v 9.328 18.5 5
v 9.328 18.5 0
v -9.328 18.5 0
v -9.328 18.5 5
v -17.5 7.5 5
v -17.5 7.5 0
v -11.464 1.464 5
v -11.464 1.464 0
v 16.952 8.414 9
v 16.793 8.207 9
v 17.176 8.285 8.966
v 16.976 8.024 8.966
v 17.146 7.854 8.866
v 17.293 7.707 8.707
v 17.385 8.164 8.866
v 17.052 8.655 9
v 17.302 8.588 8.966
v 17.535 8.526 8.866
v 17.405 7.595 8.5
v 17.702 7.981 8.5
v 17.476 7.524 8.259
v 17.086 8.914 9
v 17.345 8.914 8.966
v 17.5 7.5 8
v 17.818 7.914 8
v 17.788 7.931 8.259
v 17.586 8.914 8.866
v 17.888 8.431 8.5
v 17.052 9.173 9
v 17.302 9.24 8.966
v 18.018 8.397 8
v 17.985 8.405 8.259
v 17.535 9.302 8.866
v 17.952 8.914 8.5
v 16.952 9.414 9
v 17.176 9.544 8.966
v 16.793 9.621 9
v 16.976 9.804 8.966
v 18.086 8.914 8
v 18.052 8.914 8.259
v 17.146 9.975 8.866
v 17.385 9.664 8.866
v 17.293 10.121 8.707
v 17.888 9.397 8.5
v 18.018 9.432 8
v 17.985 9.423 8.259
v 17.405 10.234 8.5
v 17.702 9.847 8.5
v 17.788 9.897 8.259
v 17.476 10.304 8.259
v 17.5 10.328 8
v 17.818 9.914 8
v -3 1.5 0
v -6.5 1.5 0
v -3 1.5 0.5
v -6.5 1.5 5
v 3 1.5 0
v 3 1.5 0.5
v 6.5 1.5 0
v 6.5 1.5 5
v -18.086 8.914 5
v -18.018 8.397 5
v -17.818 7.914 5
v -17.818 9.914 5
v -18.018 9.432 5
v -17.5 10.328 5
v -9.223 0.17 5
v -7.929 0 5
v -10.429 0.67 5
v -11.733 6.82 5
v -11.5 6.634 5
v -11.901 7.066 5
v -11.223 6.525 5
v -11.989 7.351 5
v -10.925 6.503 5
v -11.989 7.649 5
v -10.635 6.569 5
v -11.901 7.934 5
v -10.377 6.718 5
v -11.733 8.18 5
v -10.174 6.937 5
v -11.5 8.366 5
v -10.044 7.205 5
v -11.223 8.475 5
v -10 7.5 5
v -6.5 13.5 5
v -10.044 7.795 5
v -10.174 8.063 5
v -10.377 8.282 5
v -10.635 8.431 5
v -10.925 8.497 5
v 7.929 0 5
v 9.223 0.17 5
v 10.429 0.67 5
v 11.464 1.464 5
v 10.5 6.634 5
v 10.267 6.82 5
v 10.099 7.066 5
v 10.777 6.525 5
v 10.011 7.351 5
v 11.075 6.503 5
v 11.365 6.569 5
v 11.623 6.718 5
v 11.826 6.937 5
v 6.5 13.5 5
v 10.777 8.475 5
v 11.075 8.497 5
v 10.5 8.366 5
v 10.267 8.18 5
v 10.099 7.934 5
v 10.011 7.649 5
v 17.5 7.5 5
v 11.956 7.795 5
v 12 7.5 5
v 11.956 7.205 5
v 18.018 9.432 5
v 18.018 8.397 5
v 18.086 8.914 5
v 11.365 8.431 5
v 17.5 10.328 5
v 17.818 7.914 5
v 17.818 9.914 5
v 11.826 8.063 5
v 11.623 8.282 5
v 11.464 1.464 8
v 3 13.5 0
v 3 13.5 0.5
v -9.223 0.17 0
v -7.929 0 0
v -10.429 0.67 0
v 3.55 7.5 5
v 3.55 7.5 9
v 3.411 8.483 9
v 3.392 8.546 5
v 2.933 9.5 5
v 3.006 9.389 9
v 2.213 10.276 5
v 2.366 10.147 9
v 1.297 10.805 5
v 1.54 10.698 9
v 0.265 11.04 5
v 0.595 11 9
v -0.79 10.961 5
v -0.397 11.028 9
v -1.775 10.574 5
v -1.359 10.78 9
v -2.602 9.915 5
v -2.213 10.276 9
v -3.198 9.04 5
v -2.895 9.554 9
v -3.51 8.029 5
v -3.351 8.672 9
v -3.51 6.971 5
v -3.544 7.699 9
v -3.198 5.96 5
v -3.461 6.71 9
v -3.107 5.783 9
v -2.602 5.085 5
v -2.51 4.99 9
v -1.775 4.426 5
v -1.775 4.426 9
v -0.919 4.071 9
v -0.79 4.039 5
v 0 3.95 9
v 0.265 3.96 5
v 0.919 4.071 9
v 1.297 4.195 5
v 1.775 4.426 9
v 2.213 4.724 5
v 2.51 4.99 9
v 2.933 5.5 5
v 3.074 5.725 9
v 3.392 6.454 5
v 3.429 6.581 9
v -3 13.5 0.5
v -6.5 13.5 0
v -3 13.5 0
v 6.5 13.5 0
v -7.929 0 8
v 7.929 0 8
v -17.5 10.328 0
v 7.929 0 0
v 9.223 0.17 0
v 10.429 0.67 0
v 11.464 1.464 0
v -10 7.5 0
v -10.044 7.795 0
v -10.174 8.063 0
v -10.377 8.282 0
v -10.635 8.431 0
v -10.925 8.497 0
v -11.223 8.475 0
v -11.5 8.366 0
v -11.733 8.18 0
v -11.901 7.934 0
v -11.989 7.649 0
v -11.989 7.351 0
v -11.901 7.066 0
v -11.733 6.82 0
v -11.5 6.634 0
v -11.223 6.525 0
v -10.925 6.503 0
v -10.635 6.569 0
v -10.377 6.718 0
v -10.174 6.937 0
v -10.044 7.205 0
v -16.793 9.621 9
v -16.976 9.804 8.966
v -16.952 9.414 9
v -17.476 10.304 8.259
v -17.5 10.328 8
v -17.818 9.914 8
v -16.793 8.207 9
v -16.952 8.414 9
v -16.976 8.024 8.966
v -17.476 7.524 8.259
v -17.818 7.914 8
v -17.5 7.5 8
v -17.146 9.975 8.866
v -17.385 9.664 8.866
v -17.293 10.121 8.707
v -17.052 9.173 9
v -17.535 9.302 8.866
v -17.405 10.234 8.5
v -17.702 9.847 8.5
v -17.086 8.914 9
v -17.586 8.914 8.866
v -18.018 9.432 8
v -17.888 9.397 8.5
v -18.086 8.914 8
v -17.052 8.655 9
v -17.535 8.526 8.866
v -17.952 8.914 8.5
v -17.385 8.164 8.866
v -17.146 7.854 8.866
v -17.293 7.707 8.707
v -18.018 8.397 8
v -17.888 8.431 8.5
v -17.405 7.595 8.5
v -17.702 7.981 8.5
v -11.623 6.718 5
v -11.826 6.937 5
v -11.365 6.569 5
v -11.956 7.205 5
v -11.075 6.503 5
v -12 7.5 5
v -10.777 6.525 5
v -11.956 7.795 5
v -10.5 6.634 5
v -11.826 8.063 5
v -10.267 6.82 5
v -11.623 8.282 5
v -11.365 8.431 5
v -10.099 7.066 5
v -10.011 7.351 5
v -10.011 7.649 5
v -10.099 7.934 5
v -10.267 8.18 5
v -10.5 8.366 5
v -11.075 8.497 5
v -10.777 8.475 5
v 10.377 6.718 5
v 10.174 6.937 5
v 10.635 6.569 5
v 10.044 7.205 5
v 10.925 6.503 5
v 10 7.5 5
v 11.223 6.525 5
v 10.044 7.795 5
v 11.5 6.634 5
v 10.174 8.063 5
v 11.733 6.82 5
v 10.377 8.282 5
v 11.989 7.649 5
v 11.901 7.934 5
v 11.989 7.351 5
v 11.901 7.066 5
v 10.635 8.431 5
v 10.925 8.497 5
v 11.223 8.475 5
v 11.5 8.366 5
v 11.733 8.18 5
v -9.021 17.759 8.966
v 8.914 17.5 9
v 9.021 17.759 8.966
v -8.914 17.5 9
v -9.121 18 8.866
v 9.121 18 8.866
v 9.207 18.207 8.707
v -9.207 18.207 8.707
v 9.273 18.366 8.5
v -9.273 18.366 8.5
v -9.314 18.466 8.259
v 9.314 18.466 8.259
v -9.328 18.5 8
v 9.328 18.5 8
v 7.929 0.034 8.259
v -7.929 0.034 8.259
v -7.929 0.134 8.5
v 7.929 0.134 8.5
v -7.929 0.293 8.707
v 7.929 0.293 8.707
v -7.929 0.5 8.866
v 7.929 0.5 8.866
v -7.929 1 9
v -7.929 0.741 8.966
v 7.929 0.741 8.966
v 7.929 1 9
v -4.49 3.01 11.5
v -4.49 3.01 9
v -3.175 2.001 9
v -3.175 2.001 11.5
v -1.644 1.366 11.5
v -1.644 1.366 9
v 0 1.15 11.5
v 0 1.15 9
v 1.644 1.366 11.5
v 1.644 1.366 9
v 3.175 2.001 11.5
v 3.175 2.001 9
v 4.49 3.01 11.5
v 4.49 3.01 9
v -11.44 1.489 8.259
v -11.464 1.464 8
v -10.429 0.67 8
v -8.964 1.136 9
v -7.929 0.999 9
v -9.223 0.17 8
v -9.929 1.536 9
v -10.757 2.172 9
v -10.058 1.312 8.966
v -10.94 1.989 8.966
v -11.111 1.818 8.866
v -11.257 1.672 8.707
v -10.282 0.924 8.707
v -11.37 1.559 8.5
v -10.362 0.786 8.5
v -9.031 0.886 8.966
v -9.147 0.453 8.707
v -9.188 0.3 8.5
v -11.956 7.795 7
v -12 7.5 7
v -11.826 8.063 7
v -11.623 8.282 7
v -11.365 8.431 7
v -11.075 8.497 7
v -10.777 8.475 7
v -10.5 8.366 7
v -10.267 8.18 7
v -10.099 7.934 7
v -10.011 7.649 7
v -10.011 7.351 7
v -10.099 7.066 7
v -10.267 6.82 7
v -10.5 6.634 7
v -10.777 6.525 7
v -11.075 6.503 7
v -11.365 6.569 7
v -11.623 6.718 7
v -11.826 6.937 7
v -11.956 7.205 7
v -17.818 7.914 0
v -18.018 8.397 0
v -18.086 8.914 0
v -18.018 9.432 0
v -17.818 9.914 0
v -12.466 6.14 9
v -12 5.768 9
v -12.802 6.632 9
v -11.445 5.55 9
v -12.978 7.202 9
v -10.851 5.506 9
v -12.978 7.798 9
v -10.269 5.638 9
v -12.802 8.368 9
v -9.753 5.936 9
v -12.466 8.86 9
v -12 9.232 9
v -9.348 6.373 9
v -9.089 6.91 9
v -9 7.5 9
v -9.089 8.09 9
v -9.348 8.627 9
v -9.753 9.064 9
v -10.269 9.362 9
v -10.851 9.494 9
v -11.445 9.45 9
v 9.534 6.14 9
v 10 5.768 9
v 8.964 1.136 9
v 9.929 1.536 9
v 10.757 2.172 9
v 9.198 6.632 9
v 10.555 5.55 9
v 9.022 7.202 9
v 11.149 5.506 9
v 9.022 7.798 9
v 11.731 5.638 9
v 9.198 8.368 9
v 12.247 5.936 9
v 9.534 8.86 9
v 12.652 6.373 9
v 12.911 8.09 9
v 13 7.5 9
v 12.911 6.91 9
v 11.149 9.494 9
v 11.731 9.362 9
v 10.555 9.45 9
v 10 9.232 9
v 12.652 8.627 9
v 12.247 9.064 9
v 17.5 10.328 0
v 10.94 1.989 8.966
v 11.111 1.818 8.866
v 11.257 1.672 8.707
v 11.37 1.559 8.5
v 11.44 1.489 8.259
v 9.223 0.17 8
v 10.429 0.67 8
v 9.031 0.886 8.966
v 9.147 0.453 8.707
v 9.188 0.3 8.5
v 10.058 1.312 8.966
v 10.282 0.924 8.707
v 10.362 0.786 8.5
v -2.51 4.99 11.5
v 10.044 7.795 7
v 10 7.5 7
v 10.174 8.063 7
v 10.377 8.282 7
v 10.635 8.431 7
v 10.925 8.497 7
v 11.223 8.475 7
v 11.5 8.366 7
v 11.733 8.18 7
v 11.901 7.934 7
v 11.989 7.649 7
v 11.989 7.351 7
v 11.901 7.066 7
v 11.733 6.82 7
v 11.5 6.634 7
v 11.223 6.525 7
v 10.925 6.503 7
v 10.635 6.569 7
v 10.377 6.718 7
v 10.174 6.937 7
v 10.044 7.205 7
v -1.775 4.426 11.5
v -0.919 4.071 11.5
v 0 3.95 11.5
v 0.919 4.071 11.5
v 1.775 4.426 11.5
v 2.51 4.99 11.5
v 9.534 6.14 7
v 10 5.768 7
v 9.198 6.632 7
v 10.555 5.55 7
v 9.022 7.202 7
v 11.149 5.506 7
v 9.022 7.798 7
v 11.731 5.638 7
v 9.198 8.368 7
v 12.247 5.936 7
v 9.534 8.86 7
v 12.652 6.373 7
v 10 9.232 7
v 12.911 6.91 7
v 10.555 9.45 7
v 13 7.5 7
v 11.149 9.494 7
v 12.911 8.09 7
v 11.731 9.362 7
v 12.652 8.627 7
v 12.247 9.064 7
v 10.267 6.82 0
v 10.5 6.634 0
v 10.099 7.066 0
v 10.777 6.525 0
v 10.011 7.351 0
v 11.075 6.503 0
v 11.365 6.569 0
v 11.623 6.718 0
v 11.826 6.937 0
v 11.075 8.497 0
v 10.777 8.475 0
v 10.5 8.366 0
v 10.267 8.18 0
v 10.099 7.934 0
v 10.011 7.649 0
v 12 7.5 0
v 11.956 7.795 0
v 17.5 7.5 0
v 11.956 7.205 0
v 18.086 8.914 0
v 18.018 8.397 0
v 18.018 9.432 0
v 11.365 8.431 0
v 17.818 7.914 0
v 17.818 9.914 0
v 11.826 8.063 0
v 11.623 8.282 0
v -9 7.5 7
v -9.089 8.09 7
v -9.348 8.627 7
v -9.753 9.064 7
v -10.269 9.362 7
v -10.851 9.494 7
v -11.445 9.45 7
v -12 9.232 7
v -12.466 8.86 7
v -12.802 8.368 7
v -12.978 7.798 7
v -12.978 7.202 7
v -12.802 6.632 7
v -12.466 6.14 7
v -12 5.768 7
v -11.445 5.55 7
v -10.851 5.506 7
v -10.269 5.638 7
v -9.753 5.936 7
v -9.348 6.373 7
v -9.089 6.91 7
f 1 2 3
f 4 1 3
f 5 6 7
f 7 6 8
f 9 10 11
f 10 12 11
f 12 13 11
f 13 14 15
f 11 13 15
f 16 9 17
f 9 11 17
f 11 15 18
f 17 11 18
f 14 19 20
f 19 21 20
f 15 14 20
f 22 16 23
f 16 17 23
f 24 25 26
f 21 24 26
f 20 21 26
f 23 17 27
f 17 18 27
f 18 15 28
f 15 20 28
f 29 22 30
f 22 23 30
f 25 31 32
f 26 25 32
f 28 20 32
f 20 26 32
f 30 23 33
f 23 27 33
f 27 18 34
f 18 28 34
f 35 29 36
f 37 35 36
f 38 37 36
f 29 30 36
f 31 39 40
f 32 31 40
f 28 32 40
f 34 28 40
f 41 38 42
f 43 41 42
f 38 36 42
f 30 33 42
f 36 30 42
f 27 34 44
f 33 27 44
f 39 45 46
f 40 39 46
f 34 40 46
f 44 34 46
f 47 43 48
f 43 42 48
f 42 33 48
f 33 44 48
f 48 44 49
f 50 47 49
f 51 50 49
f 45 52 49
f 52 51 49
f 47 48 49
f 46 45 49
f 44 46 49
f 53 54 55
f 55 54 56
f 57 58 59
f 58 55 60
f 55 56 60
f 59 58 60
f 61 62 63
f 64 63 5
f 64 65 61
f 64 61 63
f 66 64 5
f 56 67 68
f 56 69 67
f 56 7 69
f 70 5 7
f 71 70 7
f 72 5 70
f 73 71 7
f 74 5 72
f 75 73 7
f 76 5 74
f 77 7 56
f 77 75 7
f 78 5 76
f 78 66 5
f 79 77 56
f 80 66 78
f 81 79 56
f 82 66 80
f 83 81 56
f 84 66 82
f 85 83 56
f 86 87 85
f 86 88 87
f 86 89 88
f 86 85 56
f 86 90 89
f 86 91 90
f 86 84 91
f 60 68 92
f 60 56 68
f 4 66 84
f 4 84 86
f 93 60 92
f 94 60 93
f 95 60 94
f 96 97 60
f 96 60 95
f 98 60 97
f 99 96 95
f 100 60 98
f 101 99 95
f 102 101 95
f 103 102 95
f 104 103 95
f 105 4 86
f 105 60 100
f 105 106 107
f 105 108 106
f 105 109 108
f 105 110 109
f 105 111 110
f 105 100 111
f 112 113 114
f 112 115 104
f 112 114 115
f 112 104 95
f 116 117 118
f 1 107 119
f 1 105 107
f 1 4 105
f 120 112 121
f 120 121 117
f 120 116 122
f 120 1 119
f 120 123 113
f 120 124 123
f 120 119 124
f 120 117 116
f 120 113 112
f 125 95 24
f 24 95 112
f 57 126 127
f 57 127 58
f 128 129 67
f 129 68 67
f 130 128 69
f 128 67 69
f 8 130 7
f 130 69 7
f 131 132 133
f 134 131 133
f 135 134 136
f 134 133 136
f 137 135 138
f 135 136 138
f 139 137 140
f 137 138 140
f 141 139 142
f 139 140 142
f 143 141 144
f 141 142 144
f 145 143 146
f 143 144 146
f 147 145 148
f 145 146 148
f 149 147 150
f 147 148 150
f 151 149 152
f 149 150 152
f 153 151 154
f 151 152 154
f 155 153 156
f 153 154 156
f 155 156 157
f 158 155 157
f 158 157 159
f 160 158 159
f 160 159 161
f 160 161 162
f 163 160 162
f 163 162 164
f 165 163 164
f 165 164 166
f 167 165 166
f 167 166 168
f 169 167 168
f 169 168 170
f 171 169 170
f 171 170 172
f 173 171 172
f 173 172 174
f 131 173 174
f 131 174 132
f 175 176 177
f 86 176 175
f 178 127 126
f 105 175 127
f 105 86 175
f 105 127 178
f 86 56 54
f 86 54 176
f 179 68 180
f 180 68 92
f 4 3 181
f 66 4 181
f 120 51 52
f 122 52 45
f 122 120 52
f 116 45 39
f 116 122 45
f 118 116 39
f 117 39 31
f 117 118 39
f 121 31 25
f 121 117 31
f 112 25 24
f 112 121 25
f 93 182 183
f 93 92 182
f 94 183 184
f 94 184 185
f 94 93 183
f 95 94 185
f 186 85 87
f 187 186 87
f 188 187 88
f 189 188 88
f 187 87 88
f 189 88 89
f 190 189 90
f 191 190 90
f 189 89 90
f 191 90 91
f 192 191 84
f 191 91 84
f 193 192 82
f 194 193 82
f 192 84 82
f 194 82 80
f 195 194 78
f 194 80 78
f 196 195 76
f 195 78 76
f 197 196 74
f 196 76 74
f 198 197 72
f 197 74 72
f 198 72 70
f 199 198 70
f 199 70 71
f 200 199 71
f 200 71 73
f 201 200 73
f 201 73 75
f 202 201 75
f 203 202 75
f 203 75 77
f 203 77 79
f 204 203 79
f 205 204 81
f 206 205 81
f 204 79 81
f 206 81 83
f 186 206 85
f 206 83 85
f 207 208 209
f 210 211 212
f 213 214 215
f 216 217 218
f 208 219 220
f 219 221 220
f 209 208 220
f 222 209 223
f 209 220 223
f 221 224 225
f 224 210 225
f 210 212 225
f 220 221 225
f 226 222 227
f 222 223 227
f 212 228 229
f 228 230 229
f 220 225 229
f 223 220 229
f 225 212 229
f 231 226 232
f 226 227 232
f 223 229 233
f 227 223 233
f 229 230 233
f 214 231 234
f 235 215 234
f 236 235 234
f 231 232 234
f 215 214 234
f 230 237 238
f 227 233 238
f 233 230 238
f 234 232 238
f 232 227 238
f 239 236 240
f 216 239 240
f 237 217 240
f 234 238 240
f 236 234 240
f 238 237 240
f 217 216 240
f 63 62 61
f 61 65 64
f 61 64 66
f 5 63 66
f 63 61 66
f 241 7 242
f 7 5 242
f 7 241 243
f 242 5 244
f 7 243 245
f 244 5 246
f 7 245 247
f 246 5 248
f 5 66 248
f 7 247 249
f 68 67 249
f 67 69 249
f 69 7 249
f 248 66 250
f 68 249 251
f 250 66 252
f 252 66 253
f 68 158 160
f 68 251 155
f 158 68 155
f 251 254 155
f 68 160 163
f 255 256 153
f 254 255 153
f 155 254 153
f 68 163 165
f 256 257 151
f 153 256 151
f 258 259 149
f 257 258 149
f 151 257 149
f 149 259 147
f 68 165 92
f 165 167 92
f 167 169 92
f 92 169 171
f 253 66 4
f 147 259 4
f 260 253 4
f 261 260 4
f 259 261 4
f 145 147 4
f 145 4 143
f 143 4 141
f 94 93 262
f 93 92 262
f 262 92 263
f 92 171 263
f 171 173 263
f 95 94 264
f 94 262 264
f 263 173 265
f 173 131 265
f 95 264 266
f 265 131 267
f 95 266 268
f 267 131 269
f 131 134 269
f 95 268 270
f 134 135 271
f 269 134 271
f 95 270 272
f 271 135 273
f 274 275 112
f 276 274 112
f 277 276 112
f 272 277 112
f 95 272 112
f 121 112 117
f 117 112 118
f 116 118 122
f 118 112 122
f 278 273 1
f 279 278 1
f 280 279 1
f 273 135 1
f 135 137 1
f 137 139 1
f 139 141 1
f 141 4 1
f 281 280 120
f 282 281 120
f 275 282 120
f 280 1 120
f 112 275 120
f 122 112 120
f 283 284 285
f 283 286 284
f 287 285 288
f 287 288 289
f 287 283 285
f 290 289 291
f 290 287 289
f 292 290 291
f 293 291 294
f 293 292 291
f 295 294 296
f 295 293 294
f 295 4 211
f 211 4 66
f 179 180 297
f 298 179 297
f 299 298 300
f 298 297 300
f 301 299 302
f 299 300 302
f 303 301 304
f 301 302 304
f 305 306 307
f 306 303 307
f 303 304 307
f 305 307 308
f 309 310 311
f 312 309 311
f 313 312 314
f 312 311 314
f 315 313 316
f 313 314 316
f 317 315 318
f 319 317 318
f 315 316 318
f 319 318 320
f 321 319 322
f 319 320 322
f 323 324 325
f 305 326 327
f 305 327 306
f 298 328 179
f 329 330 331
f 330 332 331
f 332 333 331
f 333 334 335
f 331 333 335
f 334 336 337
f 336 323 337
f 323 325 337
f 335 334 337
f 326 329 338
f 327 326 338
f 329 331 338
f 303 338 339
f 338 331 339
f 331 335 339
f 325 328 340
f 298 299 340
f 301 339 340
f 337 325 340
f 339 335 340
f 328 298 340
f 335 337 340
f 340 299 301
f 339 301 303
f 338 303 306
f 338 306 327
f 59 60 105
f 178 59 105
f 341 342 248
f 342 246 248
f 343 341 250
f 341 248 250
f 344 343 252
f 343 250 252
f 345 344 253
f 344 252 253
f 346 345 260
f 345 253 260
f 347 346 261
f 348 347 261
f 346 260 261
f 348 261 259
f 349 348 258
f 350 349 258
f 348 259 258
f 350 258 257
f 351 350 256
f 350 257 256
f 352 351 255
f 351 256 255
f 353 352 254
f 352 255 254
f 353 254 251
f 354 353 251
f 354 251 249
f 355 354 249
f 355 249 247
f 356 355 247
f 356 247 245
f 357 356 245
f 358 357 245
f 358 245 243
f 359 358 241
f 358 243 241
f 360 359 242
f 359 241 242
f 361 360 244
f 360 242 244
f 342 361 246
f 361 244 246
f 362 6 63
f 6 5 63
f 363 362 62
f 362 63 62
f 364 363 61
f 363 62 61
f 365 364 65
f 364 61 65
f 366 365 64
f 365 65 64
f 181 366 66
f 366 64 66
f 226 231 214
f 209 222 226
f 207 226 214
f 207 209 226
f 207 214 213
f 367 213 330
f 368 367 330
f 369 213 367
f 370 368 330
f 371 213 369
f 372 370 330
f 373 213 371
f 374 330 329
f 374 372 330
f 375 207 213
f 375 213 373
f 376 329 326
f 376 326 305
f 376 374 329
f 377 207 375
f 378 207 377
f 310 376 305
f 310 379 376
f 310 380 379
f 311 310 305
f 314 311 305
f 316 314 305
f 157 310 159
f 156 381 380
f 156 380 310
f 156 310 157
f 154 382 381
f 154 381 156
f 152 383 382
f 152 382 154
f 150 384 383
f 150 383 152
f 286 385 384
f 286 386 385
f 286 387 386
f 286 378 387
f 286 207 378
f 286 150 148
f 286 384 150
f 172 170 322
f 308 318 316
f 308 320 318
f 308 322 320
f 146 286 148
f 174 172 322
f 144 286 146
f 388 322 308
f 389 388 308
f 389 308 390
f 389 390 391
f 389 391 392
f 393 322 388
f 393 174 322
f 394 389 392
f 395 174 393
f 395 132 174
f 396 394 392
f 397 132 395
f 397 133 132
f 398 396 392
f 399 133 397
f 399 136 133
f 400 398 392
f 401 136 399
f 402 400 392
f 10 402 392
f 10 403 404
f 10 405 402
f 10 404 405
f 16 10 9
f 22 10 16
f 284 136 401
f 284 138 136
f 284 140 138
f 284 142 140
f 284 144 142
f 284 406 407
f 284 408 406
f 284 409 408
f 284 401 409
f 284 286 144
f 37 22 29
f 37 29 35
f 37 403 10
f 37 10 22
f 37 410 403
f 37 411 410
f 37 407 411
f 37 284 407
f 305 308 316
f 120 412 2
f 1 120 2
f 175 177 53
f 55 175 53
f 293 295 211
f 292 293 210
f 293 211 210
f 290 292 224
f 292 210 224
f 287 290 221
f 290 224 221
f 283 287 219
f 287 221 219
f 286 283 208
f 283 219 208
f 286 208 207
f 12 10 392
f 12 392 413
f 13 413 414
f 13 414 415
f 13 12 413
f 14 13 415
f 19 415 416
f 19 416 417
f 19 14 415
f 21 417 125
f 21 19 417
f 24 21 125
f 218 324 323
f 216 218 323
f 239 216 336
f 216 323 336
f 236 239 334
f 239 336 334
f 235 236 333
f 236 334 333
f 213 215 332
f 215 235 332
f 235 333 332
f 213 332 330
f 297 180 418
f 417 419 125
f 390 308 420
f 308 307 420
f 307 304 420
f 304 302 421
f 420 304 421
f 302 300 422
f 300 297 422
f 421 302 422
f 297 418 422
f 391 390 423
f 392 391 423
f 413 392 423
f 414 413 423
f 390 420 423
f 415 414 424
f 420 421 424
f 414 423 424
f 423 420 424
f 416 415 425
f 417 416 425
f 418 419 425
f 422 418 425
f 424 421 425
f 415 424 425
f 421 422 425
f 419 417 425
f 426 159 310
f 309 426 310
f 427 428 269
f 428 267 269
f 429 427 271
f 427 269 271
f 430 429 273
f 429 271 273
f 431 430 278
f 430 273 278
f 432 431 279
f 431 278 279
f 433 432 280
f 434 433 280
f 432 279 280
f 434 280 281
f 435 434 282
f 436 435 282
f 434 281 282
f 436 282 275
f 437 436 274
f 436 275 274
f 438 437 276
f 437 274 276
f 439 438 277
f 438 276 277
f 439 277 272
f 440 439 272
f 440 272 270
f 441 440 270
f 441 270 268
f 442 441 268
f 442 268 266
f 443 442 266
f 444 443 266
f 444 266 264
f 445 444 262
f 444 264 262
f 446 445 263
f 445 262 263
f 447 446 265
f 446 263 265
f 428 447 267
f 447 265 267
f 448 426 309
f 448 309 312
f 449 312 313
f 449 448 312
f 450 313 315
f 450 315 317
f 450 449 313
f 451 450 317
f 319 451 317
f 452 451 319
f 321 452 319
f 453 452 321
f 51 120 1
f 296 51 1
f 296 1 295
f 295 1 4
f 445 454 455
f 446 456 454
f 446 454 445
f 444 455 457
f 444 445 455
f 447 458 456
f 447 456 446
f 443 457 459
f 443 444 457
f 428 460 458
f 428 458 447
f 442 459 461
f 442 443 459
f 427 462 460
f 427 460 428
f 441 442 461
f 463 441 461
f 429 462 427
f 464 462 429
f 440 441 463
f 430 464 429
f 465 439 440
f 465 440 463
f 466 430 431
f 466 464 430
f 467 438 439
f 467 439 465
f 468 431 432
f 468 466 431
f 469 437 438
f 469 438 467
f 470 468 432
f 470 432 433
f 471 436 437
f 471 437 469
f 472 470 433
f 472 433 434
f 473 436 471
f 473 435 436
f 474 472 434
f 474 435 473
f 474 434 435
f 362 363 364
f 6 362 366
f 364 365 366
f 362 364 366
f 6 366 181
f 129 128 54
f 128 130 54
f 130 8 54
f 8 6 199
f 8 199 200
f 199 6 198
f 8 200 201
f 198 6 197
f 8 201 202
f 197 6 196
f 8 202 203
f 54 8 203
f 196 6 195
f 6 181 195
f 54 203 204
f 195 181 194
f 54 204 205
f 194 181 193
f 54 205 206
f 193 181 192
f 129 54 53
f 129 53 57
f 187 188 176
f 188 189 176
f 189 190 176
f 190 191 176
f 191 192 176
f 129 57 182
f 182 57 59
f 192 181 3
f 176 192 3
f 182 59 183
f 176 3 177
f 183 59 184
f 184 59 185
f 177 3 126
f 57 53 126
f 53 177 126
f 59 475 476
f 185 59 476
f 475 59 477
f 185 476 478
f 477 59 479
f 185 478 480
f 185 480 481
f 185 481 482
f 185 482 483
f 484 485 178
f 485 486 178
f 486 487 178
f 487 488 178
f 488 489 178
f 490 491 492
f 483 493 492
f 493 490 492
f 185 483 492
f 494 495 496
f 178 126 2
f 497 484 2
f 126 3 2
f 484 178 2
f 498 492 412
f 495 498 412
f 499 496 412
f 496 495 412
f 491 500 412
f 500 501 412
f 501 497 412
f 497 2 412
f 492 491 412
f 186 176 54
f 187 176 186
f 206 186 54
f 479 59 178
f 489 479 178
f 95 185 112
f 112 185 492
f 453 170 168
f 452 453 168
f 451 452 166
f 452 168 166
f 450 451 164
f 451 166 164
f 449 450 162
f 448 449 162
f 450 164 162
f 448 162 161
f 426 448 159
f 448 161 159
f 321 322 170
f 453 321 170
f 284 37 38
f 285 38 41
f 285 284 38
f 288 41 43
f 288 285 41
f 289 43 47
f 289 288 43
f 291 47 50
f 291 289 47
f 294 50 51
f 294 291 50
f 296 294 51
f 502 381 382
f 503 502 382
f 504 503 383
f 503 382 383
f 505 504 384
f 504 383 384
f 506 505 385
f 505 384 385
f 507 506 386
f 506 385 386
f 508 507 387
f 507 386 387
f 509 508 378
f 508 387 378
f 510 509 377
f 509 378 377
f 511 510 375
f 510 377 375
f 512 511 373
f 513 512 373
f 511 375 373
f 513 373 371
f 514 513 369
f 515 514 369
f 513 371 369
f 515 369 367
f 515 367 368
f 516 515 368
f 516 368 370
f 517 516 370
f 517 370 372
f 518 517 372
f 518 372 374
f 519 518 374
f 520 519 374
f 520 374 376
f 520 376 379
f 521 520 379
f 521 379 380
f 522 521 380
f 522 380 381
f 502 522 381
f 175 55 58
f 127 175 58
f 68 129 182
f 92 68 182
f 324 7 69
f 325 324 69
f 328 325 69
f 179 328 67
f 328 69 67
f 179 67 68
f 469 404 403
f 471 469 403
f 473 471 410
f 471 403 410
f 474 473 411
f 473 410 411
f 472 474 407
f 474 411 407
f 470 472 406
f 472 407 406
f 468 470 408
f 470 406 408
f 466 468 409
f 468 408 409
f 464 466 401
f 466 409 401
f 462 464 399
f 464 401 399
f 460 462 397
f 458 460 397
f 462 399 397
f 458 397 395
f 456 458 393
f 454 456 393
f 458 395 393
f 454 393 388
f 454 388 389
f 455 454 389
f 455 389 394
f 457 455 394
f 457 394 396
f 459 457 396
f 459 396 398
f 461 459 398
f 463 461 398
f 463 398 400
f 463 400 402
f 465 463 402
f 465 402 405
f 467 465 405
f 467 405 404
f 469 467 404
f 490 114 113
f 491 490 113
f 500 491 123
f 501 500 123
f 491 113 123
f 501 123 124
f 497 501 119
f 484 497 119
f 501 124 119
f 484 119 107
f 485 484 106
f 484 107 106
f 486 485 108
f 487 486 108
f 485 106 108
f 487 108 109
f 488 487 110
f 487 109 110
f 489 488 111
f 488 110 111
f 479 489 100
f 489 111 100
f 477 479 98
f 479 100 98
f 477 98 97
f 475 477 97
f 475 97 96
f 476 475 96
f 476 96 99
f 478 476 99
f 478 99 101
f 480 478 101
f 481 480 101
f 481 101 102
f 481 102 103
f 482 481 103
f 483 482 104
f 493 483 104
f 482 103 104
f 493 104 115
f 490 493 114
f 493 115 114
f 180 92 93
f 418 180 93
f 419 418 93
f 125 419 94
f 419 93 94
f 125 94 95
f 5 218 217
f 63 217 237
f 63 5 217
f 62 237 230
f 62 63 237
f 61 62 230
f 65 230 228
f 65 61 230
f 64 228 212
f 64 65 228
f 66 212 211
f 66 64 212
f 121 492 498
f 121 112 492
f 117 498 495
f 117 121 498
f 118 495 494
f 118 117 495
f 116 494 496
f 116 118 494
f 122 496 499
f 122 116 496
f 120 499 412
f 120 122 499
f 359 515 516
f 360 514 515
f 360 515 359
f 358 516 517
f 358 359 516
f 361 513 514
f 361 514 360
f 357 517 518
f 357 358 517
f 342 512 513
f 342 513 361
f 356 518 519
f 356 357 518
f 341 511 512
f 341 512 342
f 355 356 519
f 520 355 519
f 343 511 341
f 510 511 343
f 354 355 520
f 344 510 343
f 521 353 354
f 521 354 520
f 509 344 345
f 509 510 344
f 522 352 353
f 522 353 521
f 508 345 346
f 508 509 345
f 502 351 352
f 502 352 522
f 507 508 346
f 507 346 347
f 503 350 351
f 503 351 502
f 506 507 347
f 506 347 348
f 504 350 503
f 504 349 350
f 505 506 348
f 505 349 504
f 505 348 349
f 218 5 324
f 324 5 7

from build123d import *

# Parameters (mm, degrees)
F0_W            = 20
F0_H            = 15
F1_DEPTH        = 5
F2_R            = 1
F2_W            = 13
F2_H            = 12
F3_DEPTH        = 5
F4_W            = 6
F4_H            = 12
F5_DEPTH        = 0.5
F7_DEPTH        = 4
F8_R            = 3.55
F9_DEPTH        = 4
F10_R           = 1
F11_D           = 2
F11_DEPTH       = 20
F11_CBORE_D     = 4
F11_CBORE_DEPTH = 2
F11_TIP         = 0.600860619
F12_F1_R        = 5
F12_F2_R        = 5
F12_2_T1_DEPTH  = 9.1776695297
F12_2_T4_ANGLE  = 45
F12_2_T6_ANGLE  = 45
F13_R           = 2
F15_T1_DEPTH    = 9
F15_T4_ANGLE    = 90
F15_T6_ANGLE    = 90
F17_DEPTH       = 2.5


# Not quite as in the source:
# - a fillet or chamfer that OpenCascade refuses, or shapes differently, is made with other operations: its cross-section is extruded or revolved along the edge and cut away or added
# - two fillets or chamfers of one size are made in one step


with BuildPart() as f1:
    # F0 (on Top) → F1 (new body)
    with BuildSketch(Plane.XY):
        with Locations((0, 7.5)):
            Rectangle(F0_W, F0_H)
        Polygon((17.5, 7.5), (10, 15), (10, 0), align=None)
        Polygon((6.5, 18.5), (10, 15), (17.5, 7.5), (18.9142135624, 8.9142135624), (9.3284271247, 18.5), align=None)
        Polygon((-10, 15), (10, 15), (6.5, 18.5), (-6.5, 18.5), align=None)
        Polygon((-10, 0), (-10, 15), (-17.5, 7.5), align=None)
        Polygon((-17.5, 7.5), (-10, 15), (-6.5, 18.5), (-9.3284271247, 18.5), (-18.9142135624, 8.9142135624), align=None)
    extrude(amount=F1_DEPTH)

    # F2 (on face) → F3 (cut)
    with BuildSketch(Plane.XY.offset(5)):
        with Locations((-11, 7.5)):
            Circle(F2_R)
        with Locations((11, 7.5)):
            Circle(F2_R)
        with Locations((0, 7.5)):
            Rectangle(F2_W, F2_H)
    extrude(amount=-F3_DEPTH, mode=Mode.SUBTRACT)

    # F4 (on face) → F5 (join)
    with BuildSketch(Plane(origin=(0, 0, 0), x_dir=(1, 0, 0), z_dir=(0, 0, -1))):
        with Locations((0, -7.5)):
            Rectangle(F4_W, F4_H)
    extrude(amount=-F5_DEPTH)

    # F12: fillet of radius 5 on 2 edges, made by hand

    # F12_f1
    f12_f1_edges = [f1.edges().sort_by_distance(p)[0] for p in [
        (-10, 0, 2.5),
    ]]
    fillet(f12_f1_edges, radius=F12_F1_R)

    # F12_f2
    f12_f2_edges = [f1.edges().sort_by_distance(p)[0] for p in [
        (10, 0, 2.5),
    ]]
    fillet(f12_f2_edges, radius=F12_F2_R)

    # F13
    f13_edges = [f1.edges().sort_by_distance(p)[0] for p in [
        (-18.914214, 8.914214, 2.5),
        (18.914214, 8.914214, 2.5),
    ]]
    fillet(f13_edges, radius=F13_R)


with BuildPart() as f7:
    # F6 (on face) → F7 (new body)
    with BuildSketch(Plane.XY.offset(5)):
        Polygon((-18.9142135624, 8.9142135624), (-10, 0), (10, 0), (18.9142135624, 8.9142135624), (9.3284271247, 18.5), (-9.3284271247, 18.5), align=None)
    extrude(amount=F7_DEPTH)

    # F8 (on face) → F9 (cut)
    with BuildSketch(Plane.XY.offset(9)):
        with Locations((0, 7.5)):
            Circle(F8_R)
    extrude(amount=-F9_DEPTH, mode=Mode.SUBTRACT)

    # F10
    f10_edges = [f7.edges().sort_by_distance(p)[0] for p in [
        (-14.457107, 4.457107, 9),
        (0, 0, 9),
        (14.457107, 4.457107, 9),
        (14.12132, 13.707107, 9),
        (0, 18.5, 9),
        (-14.12132, 13.707107, 9),
    ]]
    fillet(f10_edges, radius=F10_R)

    # F11
    with Locations(Plane.XY.offset(9)):
        with Locations((11, 7.5), (-11, 7.5)):
            CounterBoreHole(F11_D / 2, F11_CBORE_D / 2, F11_CBORE_DEPTH, depth=F11_DEPTH)
            with Locations((0, 0, -(F11_DEPTH + F11_TIP / 2))):  # 118° drill point
                Cone(0, F11_D / 2, F11_TIP, mode=Mode.SUBTRACT)

    # F12#2: fillet of radius 5 on 2 edges, made by hand

    # F12_2_s2 → F12_2_t1 (cut)
    with BuildSketch(Plane.XY.offset(-0.1776695297)):
        with BuildLine():
            ThreePointArc((-11.4644660941, 1.4644660941), (-9.84234935, 0.3806023374), (-7.9289321881, 0))
            Line((-7.9289321881, 0), (-10, 0))
            Line((-10, 0), (-11.4644660941, 1.4644660941))
        make_face()
        with BuildLine():
            ThreePointArc((7.9289321881, 0), (9.84234935, 0.3806023374), (11.4644660941, 1.4644660941))
            Line((11.4644660941, 1.4644660941), (10, 0))
            Line((10, 0), (7.9289321881, 0))
        make_face()
    extrude(amount=F12_2_T1_DEPTH, mode=Mode.SUBTRACT)

    # F12_2_s3 → F12_2_t4 (revolve, cut)
    with BuildSketch(Plane.YZ.offset(7.9289321881)):
        with BuildLine():
            ThreePointArc((1, 9), (0.2928932188, 8.7071067812), (0, 8))
            Line((0, 8), (0, 9))
            Line((0, 9), (1, 9))
        make_face()
    revolve(axis=Axis((7.9289321881, 5, 9), (0, 0, 1)), revolution_arc=F12_2_T4_ANGLE, mode=Mode.SUBTRACT)

    # F12_2_s5 → F12_2_t6 (revolve, cut)
    with BuildSketch(Plane(origin=(-6.4644660941, 6.4644660941, 0), x_dir=(0, 0, 1), z_dir=(-0.7071067812, 0.7071067812, 0))):
        with BuildLine():
            ThreePointArc((9, -6.0710678119), (8.7071067812, -6.7781745931), (8, -7.0710678119))
            Line((8, -7.0710678119), (9, -7.0710678119))
            Line((9, -7.0710678119), (9, -6.0710678119))
        make_face()
    revolve(axis=Axis((-7.9289321881, 5, 9), (0, 0, 1)), revolution_arc=F12_2_T6_ANGLE, mode=Mode.SUBTRACT)

    # F15: fillet of radius 2 on 2 edges, made by hand

    # F15_s2 → F15_t1 (cut)
    with BuildSketch(Plane.XY):
        with BuildLine():
            ThreePointArc((-17.5, 7.5), (-18.0857864376, 8.9142135624), (-17.5, 10.3284271247))
            Line((-17.5, 10.3284271247), (-18.9142135624, 8.9142135624))
            Line((-18.9142135624, 8.9142135624), (-17.5, 7.5))
        make_face()
        with BuildLine():
            ThreePointArc((17.5, 10.3284271247), (18.0857864376, 8.9142135624), (17.5, 7.5))
            Line((17.5, 7.5), (18.9142135624, 8.9142135624))
            Line((18.9142135624, 8.9142135624), (17.5, 10.3284271247))
        make_face()
    extrude(amount=F15_T1_DEPTH, mode=Mode.SUBTRACT)

    # F15_s3 → F15_t4 (revolve, cut)
    with BuildSketch(Plane(origin=(12.5, 12.5, 0), x_dir=(0, 0, 1), z_dir=(-0.7071067812, -0.7071067812, 0))):
        with BuildLine():
            ThreePointArc((9, -6.0710678119), (8.7071067812, -6.7781745931), (8, -7.0710678119))
            Line((8, -7.0710678119), (9, -7.0710678119))
            Line((9, -7.0710678119), (9, -6.0710678119))
        make_face()
    revolve(axis=Axis((16.0857864376, 8.9142135624, 9), (0, 0, 1)), revolution_arc=F15_T4_ANGLE, mode=Mode.SUBTRACT)

    # F15_s5 → F15_t6 (revolve, cut)
    with BuildSketch(Plane(origin=(-3.5857864376, -3.5857864376, 0), x_dir=(0, 0, 1), z_dir=(0.7071067812, 0.7071067812, 0))):
        with BuildLine():
            ThreePointArc((9, -18.6776695297), (8.7071067812, -19.3847763109), (8, -19.6776695297))
            Line((8, -19.6776695297), (9, -19.6776695297))
            Line((9, -19.6776695297), (9, -18.6776695297))
        make_face()
    revolve(axis=Axis((-16.0857864376, 8.9142135624, 9), (0, 0, 1)), revolution_arc=F15_T6_ANGLE, mode=Mode.SUBTRACT)

    # F16 (on face) → F17 (join)
    with BuildSketch(Plane.XY.offset(9)):
        with BuildLine():
            Line((-2.5102290732, 4.9897709268), (-4.4901280605, 3.0098719395))
            ThreePointArc((-4.4901280605, 3.0098719395), (0, 1.15), (4.4901280605, 3.0098719395))
            Line((4.4901280605, 3.0098719395), (2.5102290732, 4.9897709268))
            ThreePointArc((2.5102290732, 4.9897709268), (0, 3.95), (-2.5102290732, 4.9897709268))
        make_face()
    extrude(amount=F17_DEPTH)


solid = Compound([f1.part, f7.part])
